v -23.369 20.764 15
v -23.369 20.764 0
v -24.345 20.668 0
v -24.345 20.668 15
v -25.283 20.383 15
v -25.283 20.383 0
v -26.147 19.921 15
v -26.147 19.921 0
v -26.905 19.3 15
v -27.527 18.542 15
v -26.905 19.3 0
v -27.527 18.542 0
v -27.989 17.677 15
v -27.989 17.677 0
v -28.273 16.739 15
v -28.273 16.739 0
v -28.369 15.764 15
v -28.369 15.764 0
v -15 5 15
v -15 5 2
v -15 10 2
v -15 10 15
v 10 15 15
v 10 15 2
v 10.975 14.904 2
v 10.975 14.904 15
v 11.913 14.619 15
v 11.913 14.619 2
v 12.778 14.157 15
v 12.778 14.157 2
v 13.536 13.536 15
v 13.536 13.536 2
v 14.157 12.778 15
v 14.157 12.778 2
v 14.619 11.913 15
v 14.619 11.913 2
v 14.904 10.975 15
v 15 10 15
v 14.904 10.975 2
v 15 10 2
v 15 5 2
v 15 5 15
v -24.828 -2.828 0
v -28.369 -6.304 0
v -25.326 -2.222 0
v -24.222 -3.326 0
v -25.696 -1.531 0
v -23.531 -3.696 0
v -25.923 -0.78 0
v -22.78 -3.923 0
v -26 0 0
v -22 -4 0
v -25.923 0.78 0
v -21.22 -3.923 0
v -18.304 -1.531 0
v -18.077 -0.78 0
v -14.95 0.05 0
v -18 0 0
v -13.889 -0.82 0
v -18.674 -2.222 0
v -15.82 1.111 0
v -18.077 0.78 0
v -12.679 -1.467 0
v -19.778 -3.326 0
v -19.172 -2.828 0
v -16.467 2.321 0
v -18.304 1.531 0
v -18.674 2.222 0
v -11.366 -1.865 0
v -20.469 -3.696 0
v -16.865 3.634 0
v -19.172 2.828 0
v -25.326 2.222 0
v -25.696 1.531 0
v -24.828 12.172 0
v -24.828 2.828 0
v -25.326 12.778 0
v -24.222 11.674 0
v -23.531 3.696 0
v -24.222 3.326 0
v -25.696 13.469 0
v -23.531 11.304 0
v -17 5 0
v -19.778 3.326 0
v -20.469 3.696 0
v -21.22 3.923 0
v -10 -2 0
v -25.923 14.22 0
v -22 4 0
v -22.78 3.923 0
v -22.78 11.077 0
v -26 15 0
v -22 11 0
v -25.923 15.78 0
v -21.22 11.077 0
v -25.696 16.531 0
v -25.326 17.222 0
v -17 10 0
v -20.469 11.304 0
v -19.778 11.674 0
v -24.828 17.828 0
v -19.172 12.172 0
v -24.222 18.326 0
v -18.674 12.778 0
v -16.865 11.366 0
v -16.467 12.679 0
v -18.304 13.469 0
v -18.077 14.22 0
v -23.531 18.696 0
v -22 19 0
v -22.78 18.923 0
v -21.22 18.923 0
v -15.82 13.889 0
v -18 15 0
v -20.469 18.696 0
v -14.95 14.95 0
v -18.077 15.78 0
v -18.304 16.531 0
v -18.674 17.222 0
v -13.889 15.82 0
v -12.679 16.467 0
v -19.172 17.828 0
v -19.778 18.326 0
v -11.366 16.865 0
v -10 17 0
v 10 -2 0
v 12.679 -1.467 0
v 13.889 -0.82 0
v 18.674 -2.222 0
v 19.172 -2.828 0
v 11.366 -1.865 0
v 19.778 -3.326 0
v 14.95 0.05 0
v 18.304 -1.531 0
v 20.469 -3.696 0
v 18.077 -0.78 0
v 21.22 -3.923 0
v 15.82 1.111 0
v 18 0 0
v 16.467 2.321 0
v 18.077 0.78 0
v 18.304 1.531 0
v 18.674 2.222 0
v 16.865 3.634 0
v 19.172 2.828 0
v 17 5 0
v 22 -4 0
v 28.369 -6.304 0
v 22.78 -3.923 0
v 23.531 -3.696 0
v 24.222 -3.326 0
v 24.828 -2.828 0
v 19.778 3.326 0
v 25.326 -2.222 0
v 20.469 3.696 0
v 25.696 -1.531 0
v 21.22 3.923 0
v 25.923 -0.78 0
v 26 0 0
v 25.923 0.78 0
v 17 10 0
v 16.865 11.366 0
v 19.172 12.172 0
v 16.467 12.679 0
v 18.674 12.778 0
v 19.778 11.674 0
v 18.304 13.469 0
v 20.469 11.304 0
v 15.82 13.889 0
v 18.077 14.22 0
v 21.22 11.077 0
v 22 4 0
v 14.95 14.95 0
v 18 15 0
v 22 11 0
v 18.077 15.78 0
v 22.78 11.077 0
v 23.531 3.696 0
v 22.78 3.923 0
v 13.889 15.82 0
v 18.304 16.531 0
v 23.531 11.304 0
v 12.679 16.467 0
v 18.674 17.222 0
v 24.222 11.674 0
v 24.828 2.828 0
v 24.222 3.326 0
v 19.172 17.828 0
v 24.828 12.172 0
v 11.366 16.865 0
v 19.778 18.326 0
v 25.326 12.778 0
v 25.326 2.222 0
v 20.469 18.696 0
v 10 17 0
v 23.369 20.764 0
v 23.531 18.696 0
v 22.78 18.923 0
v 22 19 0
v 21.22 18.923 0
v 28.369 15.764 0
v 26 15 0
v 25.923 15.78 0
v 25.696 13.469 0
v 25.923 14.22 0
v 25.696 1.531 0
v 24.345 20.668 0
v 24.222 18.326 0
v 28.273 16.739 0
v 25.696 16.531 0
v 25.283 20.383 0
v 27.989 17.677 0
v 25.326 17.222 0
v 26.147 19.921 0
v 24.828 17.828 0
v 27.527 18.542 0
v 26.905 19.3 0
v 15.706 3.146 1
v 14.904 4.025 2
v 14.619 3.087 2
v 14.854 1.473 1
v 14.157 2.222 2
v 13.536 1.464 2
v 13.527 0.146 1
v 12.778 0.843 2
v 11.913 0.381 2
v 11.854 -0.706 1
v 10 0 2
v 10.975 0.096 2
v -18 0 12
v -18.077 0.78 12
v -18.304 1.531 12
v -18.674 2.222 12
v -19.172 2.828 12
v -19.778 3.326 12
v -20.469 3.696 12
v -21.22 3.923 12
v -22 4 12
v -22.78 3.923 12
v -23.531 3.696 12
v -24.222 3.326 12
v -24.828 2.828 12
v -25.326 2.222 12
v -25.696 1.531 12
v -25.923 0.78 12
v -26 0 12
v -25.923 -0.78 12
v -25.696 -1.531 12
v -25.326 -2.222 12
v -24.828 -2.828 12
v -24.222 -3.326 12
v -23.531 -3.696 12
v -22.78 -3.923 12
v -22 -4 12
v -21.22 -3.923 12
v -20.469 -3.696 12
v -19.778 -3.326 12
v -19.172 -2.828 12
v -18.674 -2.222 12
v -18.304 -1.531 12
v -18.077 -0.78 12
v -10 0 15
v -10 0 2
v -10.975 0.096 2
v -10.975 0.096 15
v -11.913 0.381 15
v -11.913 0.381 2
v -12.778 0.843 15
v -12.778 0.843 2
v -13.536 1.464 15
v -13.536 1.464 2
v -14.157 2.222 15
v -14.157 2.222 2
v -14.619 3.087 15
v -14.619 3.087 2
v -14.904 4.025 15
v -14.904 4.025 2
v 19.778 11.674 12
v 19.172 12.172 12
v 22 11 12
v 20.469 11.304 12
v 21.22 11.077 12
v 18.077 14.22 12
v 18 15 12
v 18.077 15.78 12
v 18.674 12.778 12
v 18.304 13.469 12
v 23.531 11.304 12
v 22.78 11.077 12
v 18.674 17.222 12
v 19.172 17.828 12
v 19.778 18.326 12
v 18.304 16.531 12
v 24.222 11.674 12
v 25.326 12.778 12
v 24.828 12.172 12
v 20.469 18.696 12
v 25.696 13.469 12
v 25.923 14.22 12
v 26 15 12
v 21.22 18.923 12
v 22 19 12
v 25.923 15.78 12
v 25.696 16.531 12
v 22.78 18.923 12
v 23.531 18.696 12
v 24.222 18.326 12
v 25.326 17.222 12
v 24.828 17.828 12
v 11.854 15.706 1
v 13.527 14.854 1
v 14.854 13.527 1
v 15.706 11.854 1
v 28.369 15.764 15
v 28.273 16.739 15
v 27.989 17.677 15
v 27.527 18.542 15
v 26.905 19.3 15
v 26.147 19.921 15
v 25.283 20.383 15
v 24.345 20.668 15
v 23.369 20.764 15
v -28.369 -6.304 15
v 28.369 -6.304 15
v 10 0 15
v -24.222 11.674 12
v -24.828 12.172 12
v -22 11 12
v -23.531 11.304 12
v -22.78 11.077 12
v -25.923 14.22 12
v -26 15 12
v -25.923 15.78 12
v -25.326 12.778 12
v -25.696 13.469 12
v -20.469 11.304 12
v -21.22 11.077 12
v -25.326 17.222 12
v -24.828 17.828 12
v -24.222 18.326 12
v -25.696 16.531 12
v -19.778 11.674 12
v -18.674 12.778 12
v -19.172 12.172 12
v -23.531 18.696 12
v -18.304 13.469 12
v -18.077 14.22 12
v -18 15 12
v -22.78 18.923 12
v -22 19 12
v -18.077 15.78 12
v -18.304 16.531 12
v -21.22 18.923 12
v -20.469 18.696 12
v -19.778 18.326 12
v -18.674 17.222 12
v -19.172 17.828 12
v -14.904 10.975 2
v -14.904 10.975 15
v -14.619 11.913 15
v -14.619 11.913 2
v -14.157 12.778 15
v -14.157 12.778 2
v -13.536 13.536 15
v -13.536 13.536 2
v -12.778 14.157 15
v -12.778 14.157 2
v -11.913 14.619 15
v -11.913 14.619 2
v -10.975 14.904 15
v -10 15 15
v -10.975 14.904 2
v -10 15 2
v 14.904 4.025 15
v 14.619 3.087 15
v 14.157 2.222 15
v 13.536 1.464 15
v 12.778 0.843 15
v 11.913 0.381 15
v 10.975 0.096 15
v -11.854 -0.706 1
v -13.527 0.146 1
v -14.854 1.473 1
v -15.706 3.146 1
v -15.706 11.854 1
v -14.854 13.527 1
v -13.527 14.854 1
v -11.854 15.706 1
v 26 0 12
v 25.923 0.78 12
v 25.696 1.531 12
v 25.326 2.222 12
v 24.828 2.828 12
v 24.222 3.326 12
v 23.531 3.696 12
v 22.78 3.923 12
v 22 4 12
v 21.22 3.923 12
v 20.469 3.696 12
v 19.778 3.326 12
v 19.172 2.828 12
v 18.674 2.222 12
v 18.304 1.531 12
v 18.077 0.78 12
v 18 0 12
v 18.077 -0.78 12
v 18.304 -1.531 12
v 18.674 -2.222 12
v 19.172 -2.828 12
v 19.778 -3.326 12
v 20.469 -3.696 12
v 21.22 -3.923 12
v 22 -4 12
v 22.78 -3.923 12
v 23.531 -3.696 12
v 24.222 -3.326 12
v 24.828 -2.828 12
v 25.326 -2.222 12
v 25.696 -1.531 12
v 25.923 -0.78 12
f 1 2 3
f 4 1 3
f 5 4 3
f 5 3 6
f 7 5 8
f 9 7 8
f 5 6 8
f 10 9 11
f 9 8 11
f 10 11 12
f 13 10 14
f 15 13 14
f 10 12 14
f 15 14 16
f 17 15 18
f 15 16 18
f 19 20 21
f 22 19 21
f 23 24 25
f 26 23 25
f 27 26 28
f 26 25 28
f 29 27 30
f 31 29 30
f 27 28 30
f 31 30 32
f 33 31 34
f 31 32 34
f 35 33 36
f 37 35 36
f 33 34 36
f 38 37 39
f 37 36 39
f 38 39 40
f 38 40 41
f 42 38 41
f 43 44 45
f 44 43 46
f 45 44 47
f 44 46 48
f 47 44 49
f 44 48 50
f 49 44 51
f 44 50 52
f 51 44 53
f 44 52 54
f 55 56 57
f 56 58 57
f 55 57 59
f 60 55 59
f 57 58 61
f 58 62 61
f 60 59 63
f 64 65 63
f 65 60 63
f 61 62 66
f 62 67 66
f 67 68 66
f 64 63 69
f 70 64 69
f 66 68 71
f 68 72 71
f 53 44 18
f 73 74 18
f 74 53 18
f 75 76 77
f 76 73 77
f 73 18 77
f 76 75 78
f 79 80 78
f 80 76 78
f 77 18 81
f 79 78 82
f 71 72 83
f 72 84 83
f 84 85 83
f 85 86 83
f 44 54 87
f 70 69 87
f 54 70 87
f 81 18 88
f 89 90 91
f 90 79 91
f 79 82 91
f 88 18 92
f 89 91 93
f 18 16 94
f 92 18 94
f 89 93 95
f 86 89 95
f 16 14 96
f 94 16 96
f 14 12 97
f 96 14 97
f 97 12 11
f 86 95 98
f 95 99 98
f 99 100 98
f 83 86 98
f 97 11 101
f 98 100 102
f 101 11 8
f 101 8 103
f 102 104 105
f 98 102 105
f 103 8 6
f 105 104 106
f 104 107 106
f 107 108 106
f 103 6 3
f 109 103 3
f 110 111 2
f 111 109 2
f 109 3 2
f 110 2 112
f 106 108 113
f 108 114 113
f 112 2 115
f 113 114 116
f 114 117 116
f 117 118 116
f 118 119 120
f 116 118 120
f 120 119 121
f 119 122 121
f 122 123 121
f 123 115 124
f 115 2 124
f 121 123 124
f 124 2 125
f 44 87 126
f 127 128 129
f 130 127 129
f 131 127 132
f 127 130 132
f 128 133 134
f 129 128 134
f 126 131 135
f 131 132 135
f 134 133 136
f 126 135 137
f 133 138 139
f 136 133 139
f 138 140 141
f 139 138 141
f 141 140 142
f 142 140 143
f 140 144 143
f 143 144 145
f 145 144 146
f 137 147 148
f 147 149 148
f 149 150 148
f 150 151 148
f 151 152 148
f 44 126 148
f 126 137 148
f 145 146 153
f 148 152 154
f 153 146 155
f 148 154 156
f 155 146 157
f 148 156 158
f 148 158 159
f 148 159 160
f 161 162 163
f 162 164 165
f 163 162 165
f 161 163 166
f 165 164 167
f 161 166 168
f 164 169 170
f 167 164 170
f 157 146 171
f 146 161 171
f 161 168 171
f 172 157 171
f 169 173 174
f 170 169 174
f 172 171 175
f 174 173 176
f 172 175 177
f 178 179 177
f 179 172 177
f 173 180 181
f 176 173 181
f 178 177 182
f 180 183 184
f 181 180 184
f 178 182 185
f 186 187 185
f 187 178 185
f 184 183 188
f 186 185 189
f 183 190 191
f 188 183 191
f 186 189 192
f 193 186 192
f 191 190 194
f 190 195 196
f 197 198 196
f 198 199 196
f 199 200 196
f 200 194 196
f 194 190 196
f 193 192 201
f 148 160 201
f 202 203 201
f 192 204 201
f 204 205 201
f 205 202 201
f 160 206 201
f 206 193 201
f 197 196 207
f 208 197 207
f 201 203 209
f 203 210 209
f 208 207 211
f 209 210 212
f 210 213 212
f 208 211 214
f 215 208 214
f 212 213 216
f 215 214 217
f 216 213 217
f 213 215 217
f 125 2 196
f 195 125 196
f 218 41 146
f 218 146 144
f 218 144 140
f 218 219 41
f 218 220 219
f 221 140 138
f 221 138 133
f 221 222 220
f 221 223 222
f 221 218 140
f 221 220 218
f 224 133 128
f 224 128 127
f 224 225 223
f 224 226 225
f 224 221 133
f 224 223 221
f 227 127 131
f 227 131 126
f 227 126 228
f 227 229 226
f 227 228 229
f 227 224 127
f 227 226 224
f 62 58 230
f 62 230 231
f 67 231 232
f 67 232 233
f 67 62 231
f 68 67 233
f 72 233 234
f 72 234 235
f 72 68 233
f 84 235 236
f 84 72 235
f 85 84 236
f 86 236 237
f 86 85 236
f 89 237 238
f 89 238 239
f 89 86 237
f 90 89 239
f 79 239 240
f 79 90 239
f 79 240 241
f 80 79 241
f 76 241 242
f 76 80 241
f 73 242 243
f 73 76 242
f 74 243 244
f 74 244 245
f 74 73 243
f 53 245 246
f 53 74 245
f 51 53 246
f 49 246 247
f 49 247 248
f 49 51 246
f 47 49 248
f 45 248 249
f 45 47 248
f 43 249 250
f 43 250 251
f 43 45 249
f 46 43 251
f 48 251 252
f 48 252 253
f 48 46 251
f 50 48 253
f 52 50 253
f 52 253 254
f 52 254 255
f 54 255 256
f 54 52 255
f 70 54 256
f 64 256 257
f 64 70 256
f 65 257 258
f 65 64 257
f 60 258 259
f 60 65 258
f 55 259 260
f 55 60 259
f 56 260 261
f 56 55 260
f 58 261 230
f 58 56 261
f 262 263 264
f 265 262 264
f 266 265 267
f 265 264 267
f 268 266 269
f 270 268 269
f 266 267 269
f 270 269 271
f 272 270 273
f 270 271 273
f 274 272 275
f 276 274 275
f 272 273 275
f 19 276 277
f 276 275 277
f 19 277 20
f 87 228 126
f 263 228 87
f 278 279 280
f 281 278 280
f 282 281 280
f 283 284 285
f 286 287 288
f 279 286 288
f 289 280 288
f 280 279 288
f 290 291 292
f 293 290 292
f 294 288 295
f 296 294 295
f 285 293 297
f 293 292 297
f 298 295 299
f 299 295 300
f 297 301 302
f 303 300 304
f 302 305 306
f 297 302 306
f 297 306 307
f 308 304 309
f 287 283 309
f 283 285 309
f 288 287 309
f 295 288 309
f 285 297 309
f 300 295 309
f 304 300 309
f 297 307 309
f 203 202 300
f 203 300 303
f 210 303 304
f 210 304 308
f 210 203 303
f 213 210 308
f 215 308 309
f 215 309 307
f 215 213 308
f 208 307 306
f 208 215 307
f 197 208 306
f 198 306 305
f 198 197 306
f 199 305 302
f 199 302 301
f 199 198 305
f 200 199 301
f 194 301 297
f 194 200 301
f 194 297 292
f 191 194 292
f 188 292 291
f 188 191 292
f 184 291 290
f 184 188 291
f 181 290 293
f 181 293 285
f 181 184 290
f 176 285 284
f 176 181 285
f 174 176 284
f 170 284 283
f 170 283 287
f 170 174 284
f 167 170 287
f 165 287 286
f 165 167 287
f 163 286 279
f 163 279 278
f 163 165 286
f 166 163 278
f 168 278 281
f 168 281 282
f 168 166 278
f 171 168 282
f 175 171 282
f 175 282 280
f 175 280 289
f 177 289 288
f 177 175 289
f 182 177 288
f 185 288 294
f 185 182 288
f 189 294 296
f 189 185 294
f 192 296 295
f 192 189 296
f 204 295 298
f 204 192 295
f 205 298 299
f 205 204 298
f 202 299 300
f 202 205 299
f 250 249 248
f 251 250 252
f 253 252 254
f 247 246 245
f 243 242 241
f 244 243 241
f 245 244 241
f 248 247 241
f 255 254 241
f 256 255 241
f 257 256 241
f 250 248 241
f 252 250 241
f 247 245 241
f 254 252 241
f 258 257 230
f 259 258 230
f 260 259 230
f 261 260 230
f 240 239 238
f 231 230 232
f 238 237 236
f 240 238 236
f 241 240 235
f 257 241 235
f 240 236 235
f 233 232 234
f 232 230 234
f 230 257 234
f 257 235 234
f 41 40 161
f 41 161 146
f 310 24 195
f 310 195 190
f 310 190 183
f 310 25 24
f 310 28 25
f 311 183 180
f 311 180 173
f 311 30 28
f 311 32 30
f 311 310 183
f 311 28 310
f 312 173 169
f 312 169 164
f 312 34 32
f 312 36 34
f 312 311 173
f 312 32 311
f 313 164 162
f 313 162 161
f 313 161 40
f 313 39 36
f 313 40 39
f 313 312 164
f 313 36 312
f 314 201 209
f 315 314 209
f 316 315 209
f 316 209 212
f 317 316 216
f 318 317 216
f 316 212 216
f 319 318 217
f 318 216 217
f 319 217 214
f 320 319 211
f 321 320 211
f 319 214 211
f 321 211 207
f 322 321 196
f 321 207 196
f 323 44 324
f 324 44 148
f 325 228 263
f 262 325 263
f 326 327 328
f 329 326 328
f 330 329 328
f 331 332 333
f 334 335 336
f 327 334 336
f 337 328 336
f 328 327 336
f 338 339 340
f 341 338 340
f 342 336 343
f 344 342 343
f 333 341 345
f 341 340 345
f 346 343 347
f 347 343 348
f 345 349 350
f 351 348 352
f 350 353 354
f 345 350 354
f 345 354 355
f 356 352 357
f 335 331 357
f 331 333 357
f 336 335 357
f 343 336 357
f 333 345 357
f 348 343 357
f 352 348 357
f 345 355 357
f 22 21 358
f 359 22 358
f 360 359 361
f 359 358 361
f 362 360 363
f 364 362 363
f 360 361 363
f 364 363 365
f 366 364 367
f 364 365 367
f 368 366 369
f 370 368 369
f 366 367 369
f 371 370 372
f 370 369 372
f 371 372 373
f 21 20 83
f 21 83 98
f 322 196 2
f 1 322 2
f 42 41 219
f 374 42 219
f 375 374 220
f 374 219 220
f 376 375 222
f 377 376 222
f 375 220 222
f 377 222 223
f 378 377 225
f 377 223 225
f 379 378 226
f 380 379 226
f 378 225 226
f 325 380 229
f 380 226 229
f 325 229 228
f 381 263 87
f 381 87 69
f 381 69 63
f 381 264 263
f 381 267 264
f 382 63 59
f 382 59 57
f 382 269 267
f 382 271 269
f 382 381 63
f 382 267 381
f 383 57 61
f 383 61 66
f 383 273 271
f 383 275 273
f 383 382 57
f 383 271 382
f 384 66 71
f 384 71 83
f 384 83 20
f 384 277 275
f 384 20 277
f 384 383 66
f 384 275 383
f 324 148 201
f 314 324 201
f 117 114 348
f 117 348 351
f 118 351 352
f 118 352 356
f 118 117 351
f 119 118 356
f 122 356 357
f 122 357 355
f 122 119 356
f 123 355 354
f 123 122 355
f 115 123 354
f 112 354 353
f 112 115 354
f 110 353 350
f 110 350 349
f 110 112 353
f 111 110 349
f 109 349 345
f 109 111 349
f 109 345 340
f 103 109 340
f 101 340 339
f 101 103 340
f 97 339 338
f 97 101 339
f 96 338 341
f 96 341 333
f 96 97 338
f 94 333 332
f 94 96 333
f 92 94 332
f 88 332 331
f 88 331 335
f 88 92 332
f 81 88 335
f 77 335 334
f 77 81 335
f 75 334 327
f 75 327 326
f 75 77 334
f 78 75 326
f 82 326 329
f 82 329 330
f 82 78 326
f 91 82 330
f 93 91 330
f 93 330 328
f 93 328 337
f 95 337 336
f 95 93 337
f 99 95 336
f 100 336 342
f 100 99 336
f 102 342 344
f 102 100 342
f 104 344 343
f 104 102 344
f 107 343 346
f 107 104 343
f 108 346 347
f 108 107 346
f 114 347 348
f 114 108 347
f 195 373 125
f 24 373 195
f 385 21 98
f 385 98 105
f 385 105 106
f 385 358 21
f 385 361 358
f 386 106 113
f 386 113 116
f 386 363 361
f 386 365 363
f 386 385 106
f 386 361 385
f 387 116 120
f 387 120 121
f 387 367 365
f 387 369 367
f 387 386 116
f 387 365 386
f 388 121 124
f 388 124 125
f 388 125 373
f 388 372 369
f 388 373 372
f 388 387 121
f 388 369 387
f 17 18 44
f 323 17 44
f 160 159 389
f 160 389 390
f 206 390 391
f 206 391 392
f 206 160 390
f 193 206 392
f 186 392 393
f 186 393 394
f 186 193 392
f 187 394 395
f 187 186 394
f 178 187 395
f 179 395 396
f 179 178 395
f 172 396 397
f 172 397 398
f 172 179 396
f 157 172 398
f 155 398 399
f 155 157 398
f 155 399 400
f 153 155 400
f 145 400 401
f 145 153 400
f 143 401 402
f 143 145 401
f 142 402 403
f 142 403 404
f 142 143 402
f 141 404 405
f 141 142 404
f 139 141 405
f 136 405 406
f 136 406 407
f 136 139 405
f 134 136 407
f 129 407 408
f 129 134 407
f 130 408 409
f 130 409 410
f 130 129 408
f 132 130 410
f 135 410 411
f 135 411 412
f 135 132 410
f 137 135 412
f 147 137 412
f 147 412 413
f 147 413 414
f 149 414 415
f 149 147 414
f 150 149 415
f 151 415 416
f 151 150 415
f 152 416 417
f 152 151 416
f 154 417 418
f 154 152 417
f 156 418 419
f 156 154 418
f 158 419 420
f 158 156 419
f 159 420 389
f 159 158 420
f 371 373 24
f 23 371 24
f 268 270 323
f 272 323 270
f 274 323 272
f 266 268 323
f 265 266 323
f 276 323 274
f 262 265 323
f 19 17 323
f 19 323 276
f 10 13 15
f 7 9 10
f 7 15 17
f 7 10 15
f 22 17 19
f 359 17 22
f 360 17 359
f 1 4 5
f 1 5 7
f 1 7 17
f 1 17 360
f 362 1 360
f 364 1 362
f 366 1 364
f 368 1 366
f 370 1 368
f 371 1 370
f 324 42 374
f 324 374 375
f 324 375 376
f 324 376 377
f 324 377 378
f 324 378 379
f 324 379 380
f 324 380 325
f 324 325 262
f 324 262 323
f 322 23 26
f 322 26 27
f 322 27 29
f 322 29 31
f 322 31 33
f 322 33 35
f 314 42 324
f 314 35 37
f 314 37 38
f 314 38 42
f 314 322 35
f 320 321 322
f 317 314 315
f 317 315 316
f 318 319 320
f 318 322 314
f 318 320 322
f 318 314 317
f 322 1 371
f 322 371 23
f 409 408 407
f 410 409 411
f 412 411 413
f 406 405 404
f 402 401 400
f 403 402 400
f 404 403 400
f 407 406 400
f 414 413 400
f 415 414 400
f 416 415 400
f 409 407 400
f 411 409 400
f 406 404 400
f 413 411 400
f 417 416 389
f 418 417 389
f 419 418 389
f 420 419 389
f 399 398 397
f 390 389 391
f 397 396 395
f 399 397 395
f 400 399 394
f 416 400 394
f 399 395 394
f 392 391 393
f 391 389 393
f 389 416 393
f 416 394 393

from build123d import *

# Parameters (mm, degrees)
F0_R     = 4
F1_DEPTH = 15
F2_DEPTH = 12
F3_SIZE  = 2


with BuildPart() as f1:
    # F0 (on Top) → F1 (new body)
    with BuildSketch(Plane.XY):
        with BuildLine():
            Line((0, 15), (0, 20.764023))
            Line((0, 20.764023), (-23.369339, 20.764023))
            ThreePointArc((-23.369339, 20.764023), (-26.904873, 19.299557), (-28.369339, 15.764023))
            Line((-28.369339, 15.764023), (-28.369339, -6.304249))
            Line((-28.369339, -6.304249), (0, -6.304249))
            Line((0, -6.304249), (0, 0))
            Line((0, 0), (-10, 0))
            ThreePointArc((-10, 0), (-13.535534, 1.464466), (-15, 5))
            Line((-15, 5), (-15, 10))
            ThreePointArc((-15, 10), (-13.535534, 13.535534), (-10, 15))
            Line((-10, 15), (0, 15))
        make_face()
        with Locations((-22, 0)):
            Circle(F0_R, mode=Mode.SUBTRACT)
        with Locations((-22, 15)):
            Circle(F0_R, mode=Mode.SUBTRACT)
        with BuildLine():
            Line((23.369339, 20.764023), (0, 20.764023))
            Line((0, 20.764023), (0, 15))
            Line((0, 15), (10, 15))
            ThreePointArc((10, 15), (13.535534, 13.535534), (15, 10))
            Line((15, 10), (15, 5))
            ThreePointArc((15, 5), (13.535534, 1.464466), (10, 0))
            Line((10, 0), (0, 0))
            Line((0, 0), (0, -6.304249))
            Line((0, -6.304249), (28.369339, -6.304249))
            Line((28.369339, -6.304249), (28.369339, 15.764023))
            ThreePointArc((28.369339, 15.764023), (26.904873, 19.299557), (23.369339, 20.764023))
        make_face()
        with Locations((22, 0)):
            Circle(F0_R, mode=Mode.SUBTRACT)
        with Locations((22, 15)):
            Circle(F0_R, mode=Mode.SUBTRACT)
        with Locations((-22, 15)):
            Circle(F0_R)
        with Locations((-22, 0)):
            Circle(F0_R)
        with Locations((22, 15)):
            Circle(F0_R)
        with Locations((22, 0)):
            Circle(F0_R)
    extrude(amount=F1_DEPTH)

    # F0 (on Top) → F2 (cut)
    with BuildSketch(Plane.XY):
        with Locations((22, 15)):
            Circle(F0_R)
        with Locations((22, 0)):
            Circle(F0_R)
        with Locations((-22, 15)):
            Circle(F0_R)
        with Locations((-22, 0)):
            Circle(F0_R)
    extrude(amount=F2_DEPTH, mode=Mode.SUBTRACT)

    # F3
    f3_edges = [f1.edges().sort_by_distance(p)[0] for p in [
        (0, 15, 0),
    ]]
    chamfer(f3_edges, length=F3_SIZE)


solid = f1.part
